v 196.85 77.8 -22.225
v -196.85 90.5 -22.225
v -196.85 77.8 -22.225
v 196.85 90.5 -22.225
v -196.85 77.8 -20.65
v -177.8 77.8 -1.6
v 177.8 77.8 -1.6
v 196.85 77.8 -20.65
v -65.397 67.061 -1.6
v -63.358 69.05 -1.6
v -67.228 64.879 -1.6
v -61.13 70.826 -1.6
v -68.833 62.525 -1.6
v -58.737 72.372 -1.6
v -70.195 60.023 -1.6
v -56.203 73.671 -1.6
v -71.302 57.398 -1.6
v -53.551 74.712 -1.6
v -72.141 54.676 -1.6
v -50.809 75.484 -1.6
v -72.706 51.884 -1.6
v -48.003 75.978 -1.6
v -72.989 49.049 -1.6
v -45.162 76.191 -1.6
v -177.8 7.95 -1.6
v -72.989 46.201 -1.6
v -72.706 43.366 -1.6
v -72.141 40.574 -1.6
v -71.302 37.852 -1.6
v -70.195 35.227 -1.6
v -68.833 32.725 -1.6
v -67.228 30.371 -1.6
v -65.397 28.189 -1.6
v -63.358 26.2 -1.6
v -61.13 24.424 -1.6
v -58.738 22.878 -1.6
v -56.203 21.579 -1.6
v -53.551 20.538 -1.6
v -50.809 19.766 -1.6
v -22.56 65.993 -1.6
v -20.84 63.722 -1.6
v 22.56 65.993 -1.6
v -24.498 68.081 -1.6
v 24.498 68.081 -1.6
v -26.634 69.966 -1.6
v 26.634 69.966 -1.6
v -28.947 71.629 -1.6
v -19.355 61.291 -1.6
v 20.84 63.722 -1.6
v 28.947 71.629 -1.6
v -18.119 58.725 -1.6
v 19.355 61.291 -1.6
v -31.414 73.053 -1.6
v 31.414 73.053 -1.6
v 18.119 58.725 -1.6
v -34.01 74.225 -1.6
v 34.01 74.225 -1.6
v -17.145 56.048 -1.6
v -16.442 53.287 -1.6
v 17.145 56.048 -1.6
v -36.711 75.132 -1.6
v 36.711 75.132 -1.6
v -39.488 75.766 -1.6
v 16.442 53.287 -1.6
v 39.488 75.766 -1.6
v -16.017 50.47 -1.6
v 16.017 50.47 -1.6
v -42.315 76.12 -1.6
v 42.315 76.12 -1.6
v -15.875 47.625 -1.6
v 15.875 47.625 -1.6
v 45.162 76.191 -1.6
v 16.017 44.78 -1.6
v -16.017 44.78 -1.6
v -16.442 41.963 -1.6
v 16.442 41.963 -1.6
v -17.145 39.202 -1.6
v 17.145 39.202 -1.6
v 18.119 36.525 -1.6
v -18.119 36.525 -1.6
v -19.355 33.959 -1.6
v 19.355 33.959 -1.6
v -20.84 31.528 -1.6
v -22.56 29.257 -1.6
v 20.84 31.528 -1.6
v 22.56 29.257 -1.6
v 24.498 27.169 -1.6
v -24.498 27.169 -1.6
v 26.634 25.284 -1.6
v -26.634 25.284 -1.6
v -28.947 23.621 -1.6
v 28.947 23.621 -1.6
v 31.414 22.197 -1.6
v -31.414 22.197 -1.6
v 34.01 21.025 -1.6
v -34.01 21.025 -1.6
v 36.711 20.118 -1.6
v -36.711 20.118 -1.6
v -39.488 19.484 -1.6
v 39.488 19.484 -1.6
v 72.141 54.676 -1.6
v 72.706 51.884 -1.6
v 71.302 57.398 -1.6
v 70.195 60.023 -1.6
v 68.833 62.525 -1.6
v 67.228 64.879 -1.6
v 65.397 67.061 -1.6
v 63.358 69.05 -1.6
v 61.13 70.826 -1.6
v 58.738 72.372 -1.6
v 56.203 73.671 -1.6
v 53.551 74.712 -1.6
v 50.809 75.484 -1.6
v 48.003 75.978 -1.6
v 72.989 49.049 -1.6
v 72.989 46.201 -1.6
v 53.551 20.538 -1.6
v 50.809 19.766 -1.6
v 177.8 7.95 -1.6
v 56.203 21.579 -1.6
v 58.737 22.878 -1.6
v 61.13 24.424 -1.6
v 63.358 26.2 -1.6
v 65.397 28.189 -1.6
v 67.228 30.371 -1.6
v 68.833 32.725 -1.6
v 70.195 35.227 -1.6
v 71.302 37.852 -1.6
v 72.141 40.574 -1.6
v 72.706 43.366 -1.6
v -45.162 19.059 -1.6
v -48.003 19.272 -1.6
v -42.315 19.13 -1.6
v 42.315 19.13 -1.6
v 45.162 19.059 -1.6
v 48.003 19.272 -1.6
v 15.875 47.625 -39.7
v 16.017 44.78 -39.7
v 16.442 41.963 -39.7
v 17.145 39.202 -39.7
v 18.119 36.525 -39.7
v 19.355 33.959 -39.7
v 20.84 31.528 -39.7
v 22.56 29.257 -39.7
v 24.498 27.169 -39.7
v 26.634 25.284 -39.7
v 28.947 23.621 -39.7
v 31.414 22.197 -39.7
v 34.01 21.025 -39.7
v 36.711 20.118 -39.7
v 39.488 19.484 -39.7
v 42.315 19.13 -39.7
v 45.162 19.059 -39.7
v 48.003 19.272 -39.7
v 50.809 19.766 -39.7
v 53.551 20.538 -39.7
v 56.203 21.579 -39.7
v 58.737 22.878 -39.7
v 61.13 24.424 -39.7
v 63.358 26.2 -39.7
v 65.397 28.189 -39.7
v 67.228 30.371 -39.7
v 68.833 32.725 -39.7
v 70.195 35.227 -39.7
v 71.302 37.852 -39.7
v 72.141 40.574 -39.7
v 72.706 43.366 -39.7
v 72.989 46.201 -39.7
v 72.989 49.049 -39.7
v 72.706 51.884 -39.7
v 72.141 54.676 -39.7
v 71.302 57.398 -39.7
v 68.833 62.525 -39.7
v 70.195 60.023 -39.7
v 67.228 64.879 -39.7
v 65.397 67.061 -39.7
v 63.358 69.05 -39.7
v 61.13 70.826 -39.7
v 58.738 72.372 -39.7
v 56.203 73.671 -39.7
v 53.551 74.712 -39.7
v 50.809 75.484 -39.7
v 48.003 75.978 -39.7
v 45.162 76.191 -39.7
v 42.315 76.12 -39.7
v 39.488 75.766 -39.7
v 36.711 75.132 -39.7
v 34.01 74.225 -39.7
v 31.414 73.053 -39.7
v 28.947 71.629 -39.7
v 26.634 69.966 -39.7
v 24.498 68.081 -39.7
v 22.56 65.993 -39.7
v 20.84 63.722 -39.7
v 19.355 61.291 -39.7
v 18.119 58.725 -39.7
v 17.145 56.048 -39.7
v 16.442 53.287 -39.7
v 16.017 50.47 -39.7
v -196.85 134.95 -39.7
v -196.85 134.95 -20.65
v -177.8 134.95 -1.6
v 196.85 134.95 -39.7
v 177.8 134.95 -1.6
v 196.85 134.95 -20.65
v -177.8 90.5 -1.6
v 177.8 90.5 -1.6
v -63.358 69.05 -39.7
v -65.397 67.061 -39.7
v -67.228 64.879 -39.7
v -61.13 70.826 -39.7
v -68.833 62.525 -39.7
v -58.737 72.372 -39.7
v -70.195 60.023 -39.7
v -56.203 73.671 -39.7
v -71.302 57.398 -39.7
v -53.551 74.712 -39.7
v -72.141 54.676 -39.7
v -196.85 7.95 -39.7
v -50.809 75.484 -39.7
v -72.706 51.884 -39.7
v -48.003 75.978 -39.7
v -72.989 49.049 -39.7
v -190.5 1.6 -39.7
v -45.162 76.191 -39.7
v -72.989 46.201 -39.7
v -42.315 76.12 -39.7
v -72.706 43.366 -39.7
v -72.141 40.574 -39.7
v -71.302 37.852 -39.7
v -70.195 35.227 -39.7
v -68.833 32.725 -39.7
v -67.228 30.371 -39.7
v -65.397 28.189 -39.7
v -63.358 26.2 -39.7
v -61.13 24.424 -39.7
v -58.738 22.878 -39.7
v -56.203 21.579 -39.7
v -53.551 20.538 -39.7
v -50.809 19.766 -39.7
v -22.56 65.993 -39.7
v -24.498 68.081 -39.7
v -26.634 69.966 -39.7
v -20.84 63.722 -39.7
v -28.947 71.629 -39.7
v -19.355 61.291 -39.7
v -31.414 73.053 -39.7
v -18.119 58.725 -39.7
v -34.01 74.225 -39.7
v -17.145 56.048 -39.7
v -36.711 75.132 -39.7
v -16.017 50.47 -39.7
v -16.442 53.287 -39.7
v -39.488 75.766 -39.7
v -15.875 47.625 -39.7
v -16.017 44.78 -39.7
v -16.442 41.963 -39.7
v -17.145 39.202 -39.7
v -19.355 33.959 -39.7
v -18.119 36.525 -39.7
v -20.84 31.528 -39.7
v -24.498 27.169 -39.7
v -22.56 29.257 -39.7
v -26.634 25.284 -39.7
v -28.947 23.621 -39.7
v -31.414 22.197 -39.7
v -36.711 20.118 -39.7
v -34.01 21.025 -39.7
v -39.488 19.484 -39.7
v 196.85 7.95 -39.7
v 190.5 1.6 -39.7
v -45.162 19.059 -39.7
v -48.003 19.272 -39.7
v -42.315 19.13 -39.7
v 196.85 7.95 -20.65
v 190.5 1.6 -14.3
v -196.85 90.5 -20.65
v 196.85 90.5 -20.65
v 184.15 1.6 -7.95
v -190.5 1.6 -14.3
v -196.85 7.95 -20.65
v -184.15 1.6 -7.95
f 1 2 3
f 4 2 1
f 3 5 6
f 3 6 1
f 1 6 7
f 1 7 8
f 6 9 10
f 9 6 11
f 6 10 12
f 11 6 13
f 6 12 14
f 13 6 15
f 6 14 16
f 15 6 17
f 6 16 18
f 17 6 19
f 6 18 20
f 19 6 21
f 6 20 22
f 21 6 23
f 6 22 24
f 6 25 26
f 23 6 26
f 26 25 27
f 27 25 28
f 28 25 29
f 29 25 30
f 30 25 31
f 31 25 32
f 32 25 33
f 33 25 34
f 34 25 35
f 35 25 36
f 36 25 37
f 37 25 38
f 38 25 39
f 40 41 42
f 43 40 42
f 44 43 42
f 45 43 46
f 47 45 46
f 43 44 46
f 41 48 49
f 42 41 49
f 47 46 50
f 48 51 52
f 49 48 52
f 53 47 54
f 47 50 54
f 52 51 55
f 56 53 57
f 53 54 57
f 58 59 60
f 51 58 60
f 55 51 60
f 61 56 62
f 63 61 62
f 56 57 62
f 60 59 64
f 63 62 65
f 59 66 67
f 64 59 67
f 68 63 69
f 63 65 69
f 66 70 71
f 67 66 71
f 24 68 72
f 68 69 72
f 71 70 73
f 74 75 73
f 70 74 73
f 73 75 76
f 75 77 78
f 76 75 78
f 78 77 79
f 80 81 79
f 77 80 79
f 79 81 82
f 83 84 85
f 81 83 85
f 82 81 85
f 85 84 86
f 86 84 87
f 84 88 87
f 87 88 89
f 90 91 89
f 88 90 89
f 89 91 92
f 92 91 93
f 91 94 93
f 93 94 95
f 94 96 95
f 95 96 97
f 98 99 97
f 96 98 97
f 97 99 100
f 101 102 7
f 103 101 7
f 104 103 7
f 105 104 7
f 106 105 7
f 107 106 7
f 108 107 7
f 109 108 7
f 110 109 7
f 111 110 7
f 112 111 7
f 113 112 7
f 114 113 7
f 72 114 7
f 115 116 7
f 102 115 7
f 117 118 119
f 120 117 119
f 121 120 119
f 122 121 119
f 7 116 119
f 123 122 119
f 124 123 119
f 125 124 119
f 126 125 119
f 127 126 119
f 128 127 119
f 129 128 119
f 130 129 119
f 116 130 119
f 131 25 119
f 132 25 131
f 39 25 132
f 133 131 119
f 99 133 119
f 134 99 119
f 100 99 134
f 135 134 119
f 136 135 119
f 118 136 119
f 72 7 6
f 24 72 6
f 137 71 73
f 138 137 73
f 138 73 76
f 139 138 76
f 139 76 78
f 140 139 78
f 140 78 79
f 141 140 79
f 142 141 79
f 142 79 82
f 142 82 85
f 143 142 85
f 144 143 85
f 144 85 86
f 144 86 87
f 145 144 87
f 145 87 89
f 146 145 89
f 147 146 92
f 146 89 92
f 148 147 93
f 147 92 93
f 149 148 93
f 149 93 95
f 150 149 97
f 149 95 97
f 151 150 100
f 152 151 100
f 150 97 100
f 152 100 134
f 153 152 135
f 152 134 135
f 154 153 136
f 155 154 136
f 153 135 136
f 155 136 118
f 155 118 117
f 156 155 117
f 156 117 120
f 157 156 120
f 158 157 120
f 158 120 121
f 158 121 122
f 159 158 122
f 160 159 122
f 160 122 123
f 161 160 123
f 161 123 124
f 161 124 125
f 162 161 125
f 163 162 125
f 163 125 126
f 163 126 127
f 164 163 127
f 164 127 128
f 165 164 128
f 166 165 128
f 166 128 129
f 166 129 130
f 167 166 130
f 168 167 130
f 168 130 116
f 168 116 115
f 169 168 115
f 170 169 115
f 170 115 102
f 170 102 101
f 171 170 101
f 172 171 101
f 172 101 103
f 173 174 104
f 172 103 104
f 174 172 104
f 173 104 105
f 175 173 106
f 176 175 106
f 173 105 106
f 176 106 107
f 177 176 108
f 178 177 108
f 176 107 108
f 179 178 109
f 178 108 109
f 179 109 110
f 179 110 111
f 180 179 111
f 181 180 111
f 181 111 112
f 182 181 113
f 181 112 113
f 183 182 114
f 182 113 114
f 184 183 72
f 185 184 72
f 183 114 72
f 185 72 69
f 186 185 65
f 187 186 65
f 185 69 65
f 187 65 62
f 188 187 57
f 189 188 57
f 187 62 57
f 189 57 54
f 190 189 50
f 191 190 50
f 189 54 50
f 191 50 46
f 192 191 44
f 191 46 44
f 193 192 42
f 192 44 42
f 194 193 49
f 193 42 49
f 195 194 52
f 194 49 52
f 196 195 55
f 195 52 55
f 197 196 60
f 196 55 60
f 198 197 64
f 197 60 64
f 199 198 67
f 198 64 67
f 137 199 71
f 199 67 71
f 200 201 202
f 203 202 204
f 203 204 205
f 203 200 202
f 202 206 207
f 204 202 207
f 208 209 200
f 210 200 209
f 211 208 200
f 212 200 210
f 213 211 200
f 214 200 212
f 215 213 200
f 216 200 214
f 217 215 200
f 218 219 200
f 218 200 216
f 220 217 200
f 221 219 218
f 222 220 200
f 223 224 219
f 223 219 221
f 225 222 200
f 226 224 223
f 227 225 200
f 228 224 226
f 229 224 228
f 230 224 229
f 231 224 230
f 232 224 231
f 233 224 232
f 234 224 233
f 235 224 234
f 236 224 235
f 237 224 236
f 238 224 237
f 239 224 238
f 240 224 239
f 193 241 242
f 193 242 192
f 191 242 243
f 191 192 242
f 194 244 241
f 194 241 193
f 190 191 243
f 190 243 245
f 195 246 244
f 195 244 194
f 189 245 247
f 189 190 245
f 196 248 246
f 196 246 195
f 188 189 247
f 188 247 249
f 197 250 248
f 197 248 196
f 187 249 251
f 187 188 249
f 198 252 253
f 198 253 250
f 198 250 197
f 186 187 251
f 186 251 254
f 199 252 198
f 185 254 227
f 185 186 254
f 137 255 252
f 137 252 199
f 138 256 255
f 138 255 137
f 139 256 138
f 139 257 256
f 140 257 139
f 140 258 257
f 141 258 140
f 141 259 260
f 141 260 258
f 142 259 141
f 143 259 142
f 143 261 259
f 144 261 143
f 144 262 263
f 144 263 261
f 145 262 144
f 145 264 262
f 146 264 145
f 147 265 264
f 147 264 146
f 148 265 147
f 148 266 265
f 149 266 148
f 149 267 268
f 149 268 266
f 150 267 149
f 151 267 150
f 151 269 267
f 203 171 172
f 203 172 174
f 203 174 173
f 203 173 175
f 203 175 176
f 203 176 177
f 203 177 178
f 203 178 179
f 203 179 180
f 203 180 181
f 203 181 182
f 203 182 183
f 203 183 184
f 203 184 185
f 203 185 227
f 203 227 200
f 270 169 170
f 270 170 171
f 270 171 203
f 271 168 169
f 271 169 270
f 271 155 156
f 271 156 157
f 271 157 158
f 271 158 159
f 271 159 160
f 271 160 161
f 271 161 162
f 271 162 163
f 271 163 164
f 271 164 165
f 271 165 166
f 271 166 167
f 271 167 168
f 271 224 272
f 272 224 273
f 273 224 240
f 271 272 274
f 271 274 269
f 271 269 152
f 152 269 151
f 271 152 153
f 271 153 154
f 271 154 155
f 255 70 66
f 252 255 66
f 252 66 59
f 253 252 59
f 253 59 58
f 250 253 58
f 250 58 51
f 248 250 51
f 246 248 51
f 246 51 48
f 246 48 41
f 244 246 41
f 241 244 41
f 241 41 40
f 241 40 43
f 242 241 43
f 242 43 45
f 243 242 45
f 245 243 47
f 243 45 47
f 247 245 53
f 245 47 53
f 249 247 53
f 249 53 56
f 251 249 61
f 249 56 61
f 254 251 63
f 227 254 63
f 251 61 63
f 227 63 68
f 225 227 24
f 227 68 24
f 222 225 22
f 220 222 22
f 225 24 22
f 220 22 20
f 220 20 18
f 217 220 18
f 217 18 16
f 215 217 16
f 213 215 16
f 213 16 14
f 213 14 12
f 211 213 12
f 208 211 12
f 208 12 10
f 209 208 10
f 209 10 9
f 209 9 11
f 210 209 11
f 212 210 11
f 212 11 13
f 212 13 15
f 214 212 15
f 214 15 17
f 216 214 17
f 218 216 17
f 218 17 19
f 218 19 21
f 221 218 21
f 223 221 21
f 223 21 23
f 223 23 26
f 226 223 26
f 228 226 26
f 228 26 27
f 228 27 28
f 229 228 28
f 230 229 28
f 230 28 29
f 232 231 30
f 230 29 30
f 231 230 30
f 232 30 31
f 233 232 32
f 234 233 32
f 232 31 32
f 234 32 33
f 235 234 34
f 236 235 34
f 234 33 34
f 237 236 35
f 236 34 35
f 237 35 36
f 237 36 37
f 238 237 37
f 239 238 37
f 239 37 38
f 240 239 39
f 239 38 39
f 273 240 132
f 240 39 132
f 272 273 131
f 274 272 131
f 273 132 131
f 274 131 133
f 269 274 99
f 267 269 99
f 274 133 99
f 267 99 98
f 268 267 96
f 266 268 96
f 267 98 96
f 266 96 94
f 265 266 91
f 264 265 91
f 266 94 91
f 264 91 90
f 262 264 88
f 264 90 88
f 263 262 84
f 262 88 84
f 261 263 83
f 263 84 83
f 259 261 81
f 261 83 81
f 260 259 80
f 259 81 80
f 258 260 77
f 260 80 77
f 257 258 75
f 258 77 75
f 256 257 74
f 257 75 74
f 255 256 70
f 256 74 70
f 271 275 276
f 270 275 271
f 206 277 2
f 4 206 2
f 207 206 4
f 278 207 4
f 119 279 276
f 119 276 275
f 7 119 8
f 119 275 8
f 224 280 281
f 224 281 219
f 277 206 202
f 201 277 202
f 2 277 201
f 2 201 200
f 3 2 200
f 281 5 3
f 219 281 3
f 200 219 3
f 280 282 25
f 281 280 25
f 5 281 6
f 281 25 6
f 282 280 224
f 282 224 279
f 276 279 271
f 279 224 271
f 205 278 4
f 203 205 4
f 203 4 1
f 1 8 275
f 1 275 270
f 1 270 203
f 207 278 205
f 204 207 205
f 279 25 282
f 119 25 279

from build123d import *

# Parameters (mm, degrees)
SKETCH1_W          = 393.7
SKETCH1_H          = 38.1
EXTRUDE1_DEPTH     = 133.35
CHAMFER1_SIZE      = 19.05
CHAMFER2_SIZE      = 6.35
SKETCH2_R          = 28.575
CUT_EXTRUDE1_DEPTH = 242.945417109
SKETCH3_W          = 406.514857882
SKETCH3_H          = 12.7
CUT_EXTRUDE2_DEPTH = 22.225


with BuildPart() as part:
    # Sketch1 → Extrude1 (new body)
    with BuildSketch(Plane(origin=(0, 1.6002, 0), x_dir=(1, 0, 0), z_dir=(0, 1, 0))):
        with Locations((0, 20.6502)):
            Rectangle(SKETCH1_W, SKETCH1_H)
    extrude(amount=EXTRUDE1_DEPTH)

    # Chamfer1
    chamfer1_edges = [part.edges().sort_by_distance(p)[0] for p in [
        (196.85, 68.2752, -1.6002),
        (-196.85, 68.2752, -1.6002),
    ]]
    chamfer(chamfer1_edges, length=CHAMFER1_SIZE)

    # Chamfer2
    chamfer2_edges = [part.edges().sort_by_distance(p)[0] for p in [
        (196.85, 1.6002, -30.1752),
        (0, 1.6002, -1.6002),
        (-196.85, 1.6002, -30.1752),
    ]]
    chamfer(chamfer2_edges, length=CHAMFER2_SIZE)

    # Sketch2 → Cut-Extrude1 (cut, through all)
    with BuildSketch(Plane.XY):
        with Locations((-44.45, 47.625)):
            Circle(SKETCH2_R)
        with Locations(Location((44.45, 47.625, 0), (0, 0, 180))):
            Circle(SKETCH2_R)
    extrude(amount=-CUT_EXTRUDE1_DEPTH, mode=Mode.SUBTRACT)

    # Sketch3 → Cut-Extrude2 (cut)
    with BuildSketch(Plane.XY):
        with Locations((0, 84.1502)):
            Rectangle(SKETCH3_W, SKETCH3_H)
    extrude(amount=-CUT_EXTRUDE2_DEPTH, mode=Mode.SUBTRACT)


solid = part.part
